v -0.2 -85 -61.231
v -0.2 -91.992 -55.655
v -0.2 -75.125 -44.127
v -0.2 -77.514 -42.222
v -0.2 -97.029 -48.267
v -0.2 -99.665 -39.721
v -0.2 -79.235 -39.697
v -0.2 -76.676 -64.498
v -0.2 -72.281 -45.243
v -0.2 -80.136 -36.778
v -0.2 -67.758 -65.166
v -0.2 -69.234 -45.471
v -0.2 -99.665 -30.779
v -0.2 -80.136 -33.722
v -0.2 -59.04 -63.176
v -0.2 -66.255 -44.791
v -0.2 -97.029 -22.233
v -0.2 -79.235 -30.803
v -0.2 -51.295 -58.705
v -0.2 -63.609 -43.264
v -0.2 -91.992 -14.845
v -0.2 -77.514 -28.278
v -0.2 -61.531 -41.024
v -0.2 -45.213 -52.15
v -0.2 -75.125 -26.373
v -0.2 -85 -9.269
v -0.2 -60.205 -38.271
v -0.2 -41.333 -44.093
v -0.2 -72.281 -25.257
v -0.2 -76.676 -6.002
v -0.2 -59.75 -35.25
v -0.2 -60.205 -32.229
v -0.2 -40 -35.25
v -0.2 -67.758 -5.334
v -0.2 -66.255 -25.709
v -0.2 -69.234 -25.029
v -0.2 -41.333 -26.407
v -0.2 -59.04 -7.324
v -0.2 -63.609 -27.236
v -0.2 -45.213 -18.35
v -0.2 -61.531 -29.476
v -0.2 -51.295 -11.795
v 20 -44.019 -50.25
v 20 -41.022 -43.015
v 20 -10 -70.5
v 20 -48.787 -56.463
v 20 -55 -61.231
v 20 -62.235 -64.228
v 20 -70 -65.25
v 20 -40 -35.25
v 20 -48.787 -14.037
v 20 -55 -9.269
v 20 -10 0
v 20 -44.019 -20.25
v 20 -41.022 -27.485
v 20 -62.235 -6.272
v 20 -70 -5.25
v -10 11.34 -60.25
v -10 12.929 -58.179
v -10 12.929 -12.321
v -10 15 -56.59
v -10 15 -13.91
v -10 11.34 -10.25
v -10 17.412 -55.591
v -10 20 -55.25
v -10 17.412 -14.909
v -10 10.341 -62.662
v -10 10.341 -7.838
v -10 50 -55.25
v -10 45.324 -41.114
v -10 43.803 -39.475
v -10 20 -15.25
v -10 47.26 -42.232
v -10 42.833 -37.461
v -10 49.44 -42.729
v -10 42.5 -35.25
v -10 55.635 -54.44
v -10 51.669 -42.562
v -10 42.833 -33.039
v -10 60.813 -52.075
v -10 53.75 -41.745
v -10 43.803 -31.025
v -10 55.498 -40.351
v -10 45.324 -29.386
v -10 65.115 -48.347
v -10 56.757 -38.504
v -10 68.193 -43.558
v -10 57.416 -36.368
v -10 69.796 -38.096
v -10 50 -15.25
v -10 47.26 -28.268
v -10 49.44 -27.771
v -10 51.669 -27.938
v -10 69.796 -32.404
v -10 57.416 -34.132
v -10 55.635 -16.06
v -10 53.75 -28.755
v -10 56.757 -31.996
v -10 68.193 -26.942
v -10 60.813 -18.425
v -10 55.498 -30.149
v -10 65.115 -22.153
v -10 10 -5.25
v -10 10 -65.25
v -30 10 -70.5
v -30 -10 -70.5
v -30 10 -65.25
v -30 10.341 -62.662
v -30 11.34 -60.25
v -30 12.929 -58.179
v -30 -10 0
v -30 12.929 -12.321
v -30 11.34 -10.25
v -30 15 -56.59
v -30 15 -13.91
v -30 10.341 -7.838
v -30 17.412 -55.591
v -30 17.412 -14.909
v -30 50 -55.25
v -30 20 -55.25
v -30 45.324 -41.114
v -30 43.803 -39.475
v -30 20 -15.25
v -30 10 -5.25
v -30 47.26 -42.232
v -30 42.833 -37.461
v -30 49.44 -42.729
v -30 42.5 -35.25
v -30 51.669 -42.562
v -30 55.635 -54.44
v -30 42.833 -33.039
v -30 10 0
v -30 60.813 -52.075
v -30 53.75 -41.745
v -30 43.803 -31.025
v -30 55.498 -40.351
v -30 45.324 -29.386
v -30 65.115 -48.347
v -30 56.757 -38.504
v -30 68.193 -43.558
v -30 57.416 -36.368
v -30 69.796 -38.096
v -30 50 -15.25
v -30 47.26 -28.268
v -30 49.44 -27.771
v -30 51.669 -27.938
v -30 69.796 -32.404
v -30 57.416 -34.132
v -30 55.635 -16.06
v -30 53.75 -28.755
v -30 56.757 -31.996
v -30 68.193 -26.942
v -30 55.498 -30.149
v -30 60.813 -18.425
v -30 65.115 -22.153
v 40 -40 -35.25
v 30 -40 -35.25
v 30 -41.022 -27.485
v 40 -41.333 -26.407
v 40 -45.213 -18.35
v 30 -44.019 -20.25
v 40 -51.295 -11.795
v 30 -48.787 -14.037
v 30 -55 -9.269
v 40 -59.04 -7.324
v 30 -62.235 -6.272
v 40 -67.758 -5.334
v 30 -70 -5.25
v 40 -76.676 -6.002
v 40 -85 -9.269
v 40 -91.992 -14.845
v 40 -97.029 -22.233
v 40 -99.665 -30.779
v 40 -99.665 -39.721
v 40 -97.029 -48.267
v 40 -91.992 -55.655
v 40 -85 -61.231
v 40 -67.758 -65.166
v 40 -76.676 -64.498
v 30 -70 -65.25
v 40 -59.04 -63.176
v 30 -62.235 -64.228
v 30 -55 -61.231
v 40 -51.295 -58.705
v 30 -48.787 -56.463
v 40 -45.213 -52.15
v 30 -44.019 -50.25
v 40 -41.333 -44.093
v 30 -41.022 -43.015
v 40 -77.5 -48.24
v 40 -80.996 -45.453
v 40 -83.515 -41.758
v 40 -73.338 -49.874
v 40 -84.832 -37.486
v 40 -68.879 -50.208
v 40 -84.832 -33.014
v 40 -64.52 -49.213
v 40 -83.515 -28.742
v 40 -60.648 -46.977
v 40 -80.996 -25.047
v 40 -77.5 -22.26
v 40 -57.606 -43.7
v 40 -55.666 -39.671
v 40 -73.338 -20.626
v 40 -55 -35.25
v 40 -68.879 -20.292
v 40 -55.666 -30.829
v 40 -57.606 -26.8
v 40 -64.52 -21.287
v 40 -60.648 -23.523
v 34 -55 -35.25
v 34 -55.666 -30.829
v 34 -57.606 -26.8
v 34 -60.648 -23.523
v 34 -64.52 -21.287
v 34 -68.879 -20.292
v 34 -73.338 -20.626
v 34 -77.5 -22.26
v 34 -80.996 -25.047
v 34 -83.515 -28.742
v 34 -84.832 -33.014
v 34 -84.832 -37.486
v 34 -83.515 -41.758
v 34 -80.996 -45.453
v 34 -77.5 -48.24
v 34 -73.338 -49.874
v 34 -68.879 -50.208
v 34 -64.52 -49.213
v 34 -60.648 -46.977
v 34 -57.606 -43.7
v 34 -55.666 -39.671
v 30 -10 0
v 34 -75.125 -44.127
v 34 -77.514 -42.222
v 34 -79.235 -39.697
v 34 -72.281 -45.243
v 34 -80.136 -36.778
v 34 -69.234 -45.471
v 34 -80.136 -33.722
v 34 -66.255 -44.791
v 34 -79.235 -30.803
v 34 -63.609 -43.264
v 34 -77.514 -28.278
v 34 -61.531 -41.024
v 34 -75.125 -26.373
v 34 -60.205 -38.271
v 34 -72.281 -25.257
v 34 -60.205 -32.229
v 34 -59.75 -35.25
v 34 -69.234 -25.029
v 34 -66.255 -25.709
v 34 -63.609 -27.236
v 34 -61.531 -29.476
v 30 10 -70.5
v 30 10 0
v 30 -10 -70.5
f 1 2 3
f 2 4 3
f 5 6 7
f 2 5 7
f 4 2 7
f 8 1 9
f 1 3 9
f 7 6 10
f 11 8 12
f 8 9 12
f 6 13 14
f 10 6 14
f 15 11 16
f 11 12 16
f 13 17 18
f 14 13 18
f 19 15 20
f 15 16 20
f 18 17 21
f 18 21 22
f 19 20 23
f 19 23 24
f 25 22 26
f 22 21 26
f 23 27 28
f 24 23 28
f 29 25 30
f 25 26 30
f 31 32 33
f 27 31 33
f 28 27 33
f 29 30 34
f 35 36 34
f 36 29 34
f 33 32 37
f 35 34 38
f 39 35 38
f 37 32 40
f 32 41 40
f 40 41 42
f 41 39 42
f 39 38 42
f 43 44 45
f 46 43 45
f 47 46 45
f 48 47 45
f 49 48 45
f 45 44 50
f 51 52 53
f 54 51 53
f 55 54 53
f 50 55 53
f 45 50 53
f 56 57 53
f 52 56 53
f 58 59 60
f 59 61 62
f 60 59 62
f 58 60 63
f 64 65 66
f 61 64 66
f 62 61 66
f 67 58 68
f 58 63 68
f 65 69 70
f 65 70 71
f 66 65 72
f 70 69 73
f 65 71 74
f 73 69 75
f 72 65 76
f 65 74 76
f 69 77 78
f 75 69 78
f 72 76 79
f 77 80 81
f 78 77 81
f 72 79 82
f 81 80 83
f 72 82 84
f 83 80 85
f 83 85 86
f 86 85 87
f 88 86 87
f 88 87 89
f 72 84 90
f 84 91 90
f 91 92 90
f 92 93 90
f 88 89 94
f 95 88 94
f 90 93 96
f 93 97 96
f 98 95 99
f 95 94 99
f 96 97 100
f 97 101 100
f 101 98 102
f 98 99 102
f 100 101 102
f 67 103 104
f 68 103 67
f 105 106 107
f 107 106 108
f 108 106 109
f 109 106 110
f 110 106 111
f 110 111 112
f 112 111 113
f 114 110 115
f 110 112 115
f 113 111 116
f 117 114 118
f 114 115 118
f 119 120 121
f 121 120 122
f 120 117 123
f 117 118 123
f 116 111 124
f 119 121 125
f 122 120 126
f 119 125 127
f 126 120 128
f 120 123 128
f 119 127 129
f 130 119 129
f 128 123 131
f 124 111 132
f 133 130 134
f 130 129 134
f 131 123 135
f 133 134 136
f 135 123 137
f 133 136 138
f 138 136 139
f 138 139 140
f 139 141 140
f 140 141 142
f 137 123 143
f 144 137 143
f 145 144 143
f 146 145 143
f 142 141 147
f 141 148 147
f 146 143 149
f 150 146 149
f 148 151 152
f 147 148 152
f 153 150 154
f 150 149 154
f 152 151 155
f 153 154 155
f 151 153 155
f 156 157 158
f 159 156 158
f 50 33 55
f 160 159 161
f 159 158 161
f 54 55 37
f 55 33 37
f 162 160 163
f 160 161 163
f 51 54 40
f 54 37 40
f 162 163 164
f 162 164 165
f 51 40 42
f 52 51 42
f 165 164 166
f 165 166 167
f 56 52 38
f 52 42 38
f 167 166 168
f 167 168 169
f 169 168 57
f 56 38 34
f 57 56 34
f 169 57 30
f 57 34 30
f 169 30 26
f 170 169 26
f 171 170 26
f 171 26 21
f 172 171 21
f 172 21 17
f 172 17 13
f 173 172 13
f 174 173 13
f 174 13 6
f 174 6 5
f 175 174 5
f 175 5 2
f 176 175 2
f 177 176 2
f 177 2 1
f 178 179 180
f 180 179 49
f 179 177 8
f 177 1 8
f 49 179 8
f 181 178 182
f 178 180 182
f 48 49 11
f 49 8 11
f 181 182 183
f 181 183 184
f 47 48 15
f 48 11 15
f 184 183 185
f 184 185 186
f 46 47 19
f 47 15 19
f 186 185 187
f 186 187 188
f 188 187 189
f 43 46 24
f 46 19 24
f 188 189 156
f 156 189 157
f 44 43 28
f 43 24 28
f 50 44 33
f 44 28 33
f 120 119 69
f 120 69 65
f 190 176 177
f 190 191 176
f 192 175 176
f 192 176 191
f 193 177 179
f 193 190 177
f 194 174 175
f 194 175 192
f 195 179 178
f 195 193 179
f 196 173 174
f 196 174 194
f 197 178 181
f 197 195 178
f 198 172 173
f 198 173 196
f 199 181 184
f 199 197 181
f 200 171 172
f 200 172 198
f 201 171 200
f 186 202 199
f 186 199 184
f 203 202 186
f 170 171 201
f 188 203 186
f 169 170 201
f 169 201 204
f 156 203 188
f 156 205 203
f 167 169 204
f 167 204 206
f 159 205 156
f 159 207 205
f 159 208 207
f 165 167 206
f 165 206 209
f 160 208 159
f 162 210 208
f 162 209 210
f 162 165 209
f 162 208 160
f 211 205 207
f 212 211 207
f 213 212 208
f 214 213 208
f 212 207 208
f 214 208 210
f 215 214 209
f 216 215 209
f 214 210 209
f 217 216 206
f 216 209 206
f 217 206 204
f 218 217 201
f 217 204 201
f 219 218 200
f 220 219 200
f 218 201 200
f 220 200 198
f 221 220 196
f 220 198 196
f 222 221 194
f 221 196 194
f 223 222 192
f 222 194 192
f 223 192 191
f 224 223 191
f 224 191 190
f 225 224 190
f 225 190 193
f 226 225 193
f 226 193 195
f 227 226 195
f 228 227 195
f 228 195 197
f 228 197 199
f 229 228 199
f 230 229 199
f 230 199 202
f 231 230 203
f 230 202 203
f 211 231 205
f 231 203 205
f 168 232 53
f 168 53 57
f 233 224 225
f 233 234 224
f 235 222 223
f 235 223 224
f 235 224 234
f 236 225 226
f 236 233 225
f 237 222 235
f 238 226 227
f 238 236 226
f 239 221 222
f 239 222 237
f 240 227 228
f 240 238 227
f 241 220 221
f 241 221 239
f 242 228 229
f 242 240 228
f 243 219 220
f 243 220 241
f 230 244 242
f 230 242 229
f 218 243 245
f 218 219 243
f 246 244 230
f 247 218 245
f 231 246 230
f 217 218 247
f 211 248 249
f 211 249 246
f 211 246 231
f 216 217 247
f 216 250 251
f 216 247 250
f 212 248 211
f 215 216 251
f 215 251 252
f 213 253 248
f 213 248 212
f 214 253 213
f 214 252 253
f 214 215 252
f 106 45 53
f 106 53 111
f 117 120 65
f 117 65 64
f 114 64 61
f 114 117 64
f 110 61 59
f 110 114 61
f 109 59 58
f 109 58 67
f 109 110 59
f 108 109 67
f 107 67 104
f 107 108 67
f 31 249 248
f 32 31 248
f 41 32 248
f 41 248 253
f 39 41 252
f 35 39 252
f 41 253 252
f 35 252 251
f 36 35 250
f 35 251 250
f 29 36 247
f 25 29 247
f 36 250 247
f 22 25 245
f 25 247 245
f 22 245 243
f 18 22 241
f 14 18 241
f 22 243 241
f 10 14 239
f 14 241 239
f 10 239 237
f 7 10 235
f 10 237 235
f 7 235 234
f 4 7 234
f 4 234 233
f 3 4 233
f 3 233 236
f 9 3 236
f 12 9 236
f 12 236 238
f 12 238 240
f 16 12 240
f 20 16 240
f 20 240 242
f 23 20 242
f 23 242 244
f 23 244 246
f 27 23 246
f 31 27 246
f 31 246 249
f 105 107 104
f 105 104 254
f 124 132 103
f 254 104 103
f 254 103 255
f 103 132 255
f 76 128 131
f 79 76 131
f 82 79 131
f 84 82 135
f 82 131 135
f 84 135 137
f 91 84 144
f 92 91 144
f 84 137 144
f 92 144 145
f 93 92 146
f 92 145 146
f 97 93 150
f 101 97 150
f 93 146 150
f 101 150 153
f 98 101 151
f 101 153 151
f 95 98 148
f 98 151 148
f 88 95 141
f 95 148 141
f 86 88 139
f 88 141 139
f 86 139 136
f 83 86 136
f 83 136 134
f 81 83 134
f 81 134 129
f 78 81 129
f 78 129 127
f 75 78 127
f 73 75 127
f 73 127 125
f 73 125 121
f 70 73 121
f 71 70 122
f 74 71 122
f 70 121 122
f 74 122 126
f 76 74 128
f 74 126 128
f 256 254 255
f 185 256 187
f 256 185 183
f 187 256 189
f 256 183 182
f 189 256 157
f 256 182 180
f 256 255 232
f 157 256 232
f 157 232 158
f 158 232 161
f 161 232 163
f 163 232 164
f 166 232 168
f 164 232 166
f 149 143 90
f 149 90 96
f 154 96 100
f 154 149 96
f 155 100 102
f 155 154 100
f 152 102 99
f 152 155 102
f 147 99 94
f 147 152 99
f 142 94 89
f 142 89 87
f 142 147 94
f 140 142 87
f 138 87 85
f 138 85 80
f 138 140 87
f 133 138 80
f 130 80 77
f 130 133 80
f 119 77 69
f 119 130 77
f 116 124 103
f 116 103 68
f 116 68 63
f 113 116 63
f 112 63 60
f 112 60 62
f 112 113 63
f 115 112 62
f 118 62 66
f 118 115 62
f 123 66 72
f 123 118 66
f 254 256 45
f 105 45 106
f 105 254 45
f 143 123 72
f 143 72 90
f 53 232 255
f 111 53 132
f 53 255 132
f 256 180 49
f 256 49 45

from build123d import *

# Parameters (mm, degrees)
BOSS_EXTRUDE1_DEPTH      = 70.5
BOSS_EXTRUDE2_DEPTH      = 10
BOSS_EXTRUDE2_DEPTH_BACK = 30.2
SKETCH2_R                = 30
SKETCH3_R                = 10.25
CUT_EXTRUDE1_DEPTH       = 92
SKETCH4_R                = 15
CUT_EXTRUDE2_DEPTH       = 6
CUT_EXTRUDE_THIN1_DEPTH  = 53
SKETCH7_R                = 7.5
BOSS_EXTRUDE5_DEPTH      = 20


with BuildPart() as part:
    # Sketch1 → Boss-Extrude1 (new body)
    with BuildSketch(Plane.XY):
        Polygon((-30, 10), (30, 10), (30, -70), (20, -70), (20, -10), (-30, -10), align=None)
    extrude(amount=-BOSS_EXTRUDE1_DEPTH)

    # Sketch2 → Boss-Extrude2 (add, two sides: drawn at the far end of the back side and taken through both)
    with BuildSketch(Plane(origin=(30, 0, 0), x_dir=(0, 0, -1), z_dir=(1, 0, 0)).offset(-BOSS_EXTRUDE2_DEPTH_BACK)):
        with Locations(Location((35.25, -70, 0), (0, 0, 90))):
            Circle(SKETCH2_R)
    extrude(amount=BOSS_EXTRUDE2_DEPTH + BOSS_EXTRUDE2_DEPTH_BACK)

    # Sketch3 → Cut-Extrude1 (cut)
    with BuildSketch(Plane(origin=(40, 0, 0), x_dir=(0, 0, -1), z_dir=(1, 0, 0))):
        with Locations(Location((35.25, -70, 0), (0, 0, 90))):
            Circle(SKETCH3_R)
    extrude(amount=-CUT_EXTRUDE1_DEPTH, mode=Mode.SUBTRACT)

    # Sketch4 → Cut-Extrude2 (cut)
    with BuildSketch(Plane(origin=(40, 0, 0), x_dir=(0, 0, -1), z_dir=(1, 0, 0))):
        with Locations(Location((35.25, -70, 0), (0, 0, 90))):
            Circle(SKETCH4_R)
    extrude(amount=-CUT_EXTRUDE2_DEPTH, mode=Mode.SUBTRACT)

    # Sketch5 → Cut-Extrude-Thin1 (cut)
    with BuildSketch(Plane(origin=(30, 0, 0), x_dir=(0, 0, -1), z_dir=(1, 0, 0))):
        Polygon((0, -10), (5.25, -70), (-4.711937175, -70.871669503), (-9.961937175, -10.871669503), align=None)
        Polygon((65.25, -70), (70.5, -10), (80.461937175, -10.871669503), (75.211937175, -70.871669503), align=None)
    extrude(amount=-CUT_EXTRUDE_THIN1_DEPTH, mode=Mode.SUBTRACT)

    # Sketch7 → Boss-Extrude5 (add)
    with BuildSketch(Plane.ZY.offset(30)):
        with BuildLine():
            ThreePointArc((-15.25, 50), (-35.25, 70), (-55.25, 50))
            Line((-55.25, 50), (-55.25, 20))
            ThreePointArc((-55.25, 20), (-58.178932188, 12.928932188), (-65.25, 10))
            Line((-65.25, 10), (-5.25, 10))
            ThreePointArc((-5.25, 10), (-12.321067812, 12.928932188), (-15.25, 20))
            Line((-15.25, 20), (-15.25, 50))
        make_face()
        with Locations(Location((-35.25, 50, 0), (0, 0, 270))):
            Circle(SKETCH7_R, mode=Mode.SUBTRACT)
    extrude(amount=-BOSS_EXTRUDE5_DEPTH)


solid = part.part
